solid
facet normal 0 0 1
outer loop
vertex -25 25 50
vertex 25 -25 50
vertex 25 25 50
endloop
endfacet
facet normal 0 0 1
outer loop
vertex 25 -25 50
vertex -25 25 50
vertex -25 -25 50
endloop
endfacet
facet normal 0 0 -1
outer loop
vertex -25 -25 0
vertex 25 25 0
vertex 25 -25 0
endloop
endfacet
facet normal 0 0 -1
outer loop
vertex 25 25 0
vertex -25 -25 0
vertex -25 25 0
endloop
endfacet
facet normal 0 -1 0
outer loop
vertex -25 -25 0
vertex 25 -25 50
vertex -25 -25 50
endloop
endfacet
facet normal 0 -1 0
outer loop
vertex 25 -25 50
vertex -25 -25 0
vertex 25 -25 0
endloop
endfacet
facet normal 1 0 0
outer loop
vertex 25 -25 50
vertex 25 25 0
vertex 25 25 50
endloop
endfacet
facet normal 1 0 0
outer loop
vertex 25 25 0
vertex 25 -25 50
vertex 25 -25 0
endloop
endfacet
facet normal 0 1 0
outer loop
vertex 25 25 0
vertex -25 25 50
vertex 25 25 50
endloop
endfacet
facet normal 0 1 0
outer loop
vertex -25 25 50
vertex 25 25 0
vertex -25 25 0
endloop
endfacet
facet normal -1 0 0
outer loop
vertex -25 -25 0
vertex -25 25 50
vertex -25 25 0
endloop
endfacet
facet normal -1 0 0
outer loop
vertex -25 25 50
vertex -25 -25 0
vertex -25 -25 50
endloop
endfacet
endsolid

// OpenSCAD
//	based off of:
//	Thingiverse Customizer Template v1.2 by MakerBlock
//  which can be found here:
//	http://www.thingiverse.com/thing:44090

//	Uncomment the library/libraries of your choice to include them
//	include <MCAD/filename.scad>
//	include <pins/pins.scad>
//	include <write/Write.scad>
//	include <utils/build_plate.scad> scrapping this one and using the one I made

//CUSTOMIZER VARIABLES
/* [Adjusting the block] */
//by having the /*[name of what you want shown]*/ you can make the drop down menu

//	This section is displays the box options
//	Measurement of box on the X axis
x_measurement = 5;	//	[1,5,10,15,20,25]
//	This creates a drop down box of numbered options

//	Measurement of box on the Y axis
y_measurement = 5;	//	[1:small, 5:medium small, 10:medium, ,15:medium large, 20:large, 25:extra large]
//	This creates a drop down box of text options with numerical values

//	Measurement of box on the Z axis
z_measurement = 5;	//	[1:25]
//	This creates a slider with a minimum and maximum

/* [Misc Demonstrations] */
//	This section demonstrates how we can create various options

text_box = 10;

//	This is the explanation text
another_text_box = 10;

//	This creates a drop down box of numbered options
number_drop_down_box = 1;	//	[0,1,2,3,4,5,6,7,8,9,10]

//	This creates a drop down box of text options
text_drop_down_box = "yes";	//	[yes,no,maybe]

//	This creates a drop down box of text options with numerical values
labeled_drop_down_box = 5;	//	[1:small, 5:medium, 10:large, 50:supersized]

//	This creates a slider with a minimum and maximum
numerical_slider = 1;	//	[0:10]

//	This option will not appear due to the *1
hidden_option = 100*1;

//	This option will also not appear
//	another_hidden_option = 101;

/*[build_plate]*/

//this is taken from my build plate library here: http://www.thingiverse.com/thing:1457320

//build plate numbers subject to change, 
build_plate_selector = 1; //[0: Manual, 1: Replicator, 2: Replicator 2, 3: Replicator 2X, 4: Replicator (5th Generation), 5: Replicator Mini, 6: Replicator Z18, 7: Thing-O-Matic, 8: Cupcake CNC, 9: Afinia H480, 10: Afinia H800, 11: AW3D HD, 12: B9Creator, 13: Robox, 14: Bukito, 15: Bukobot V2, 16: Form 1, 17: Form 2, 18: hyrel, 19: Creatr, 20: Xeed, 21: TAZ, 22: TAZ Mini, 23: Makergear M2, 24: Printrbot Plus, 25: Printrbot Simple Kit, 26: Printrbot Go small, 27: Printrbot Go medium, 28: Printrbot Go large,29:Diamond Age Moa,]
//when Build Plate Selector is set to "manual" this controls the build plate x dimension
build_plate_manual_x = 100; //[100:400]
//when Build Plate Selector is set to "manual" this controls the build plate y dimension
build_plate_manual_y = 100; //[100:400]
build_plate(build_plate_selector,build_plate_manual_x,build_plate_manual_y);

//as a bonus I also want to show my unit conversion option
/* [Unit adjustment] */
//Here are they units you deisgn in
units_entered = 10;//[1:mm, 10:cm, 1000:meter, 25.4:inch, 304.8:foot]

//and this is the unit the file is out put in, the default is mm for most printers
desired_units_for_output = 1;//[1:mm, .1:cm, 0.001:meter, 0.0393701:inch, 0.00328084:foot]
//CUSTOMIZER VARIABLES END


//just include this module into your code or have it as a library
module build_plate(bp,manX,manY){
		build_plate_templates = [[manX,manY,"manual"],[252,199,"Replicator"],[285,153,"Replicator 2"],[246,152,"Replicator 2X"],[252,199,"Replicator (5th Generation)"],[100,100,"Replicator Mini"],[300,305,"Replicator Z18"],[120,120,"Thing-O-Matic"],[100,100,"Cupcake CNC"],[140,140,"Afinia H480"],[254,203.2,"Afinia H800"],[317.5,203.2,"AW3D HD"],[104,75,"B9Creator"],[210,150,"Robox"],[150,150,"Bukito"],[200,200,"Bukobot V2"],[125,125,"Form 1"],[145,145,"Form 2"],[200,200,"hyrel"],[230,270,"Creatr"],[280,220,"Xeed"],[298,275,"TAZ"],[152,152,"TAZ Mini"],[203.2,254,"Makergear M2"],[250,250,"Printrbot Plus"],[150,150,"Printrbot Simple Kit"],[203,152,"Printrbot Go small"],[406,203,"Printrbot Go medium"],[610,305,"Printrbot Go large"],[400,400,"Diamond Age Moa"]];
		translate([0,0,-.52]){
			%cube([build_plate_templates[bp][0],build_plate_templates[bp][1],1],center = true);
			
		}
		translate([0,0,-.5]){
			for(i = [-1*floor(build_plate_templates[bp][0]/20):build_plate_templates[bp][0]/20]){
					translate([i*10,0,0])
						%cube([.5,build_plate_templates[bp][1],1.01],center = true);
				}
				for(i = [-1*floor(build_plate_templates[bp][1]/20):build_plate_templates[bp][1]/20]){
					translate([0,i*10,0])
						%cube([build_plate_templates[bp][0],.5,1.01],center = true);
				}
		}
}



//this allows you to just multiply the units in here by this factor to adjust size, in the example case, cm to mm
unit_conversion_factor = units_entered*desired_units_for_output;

//	This is the cube we've customized!
translate([0,0,z_measurement/2*unit_conversion_factor]) cube([x_measurement, y_measurement, z_measurement]*unit_conversion_factor, center=true);
